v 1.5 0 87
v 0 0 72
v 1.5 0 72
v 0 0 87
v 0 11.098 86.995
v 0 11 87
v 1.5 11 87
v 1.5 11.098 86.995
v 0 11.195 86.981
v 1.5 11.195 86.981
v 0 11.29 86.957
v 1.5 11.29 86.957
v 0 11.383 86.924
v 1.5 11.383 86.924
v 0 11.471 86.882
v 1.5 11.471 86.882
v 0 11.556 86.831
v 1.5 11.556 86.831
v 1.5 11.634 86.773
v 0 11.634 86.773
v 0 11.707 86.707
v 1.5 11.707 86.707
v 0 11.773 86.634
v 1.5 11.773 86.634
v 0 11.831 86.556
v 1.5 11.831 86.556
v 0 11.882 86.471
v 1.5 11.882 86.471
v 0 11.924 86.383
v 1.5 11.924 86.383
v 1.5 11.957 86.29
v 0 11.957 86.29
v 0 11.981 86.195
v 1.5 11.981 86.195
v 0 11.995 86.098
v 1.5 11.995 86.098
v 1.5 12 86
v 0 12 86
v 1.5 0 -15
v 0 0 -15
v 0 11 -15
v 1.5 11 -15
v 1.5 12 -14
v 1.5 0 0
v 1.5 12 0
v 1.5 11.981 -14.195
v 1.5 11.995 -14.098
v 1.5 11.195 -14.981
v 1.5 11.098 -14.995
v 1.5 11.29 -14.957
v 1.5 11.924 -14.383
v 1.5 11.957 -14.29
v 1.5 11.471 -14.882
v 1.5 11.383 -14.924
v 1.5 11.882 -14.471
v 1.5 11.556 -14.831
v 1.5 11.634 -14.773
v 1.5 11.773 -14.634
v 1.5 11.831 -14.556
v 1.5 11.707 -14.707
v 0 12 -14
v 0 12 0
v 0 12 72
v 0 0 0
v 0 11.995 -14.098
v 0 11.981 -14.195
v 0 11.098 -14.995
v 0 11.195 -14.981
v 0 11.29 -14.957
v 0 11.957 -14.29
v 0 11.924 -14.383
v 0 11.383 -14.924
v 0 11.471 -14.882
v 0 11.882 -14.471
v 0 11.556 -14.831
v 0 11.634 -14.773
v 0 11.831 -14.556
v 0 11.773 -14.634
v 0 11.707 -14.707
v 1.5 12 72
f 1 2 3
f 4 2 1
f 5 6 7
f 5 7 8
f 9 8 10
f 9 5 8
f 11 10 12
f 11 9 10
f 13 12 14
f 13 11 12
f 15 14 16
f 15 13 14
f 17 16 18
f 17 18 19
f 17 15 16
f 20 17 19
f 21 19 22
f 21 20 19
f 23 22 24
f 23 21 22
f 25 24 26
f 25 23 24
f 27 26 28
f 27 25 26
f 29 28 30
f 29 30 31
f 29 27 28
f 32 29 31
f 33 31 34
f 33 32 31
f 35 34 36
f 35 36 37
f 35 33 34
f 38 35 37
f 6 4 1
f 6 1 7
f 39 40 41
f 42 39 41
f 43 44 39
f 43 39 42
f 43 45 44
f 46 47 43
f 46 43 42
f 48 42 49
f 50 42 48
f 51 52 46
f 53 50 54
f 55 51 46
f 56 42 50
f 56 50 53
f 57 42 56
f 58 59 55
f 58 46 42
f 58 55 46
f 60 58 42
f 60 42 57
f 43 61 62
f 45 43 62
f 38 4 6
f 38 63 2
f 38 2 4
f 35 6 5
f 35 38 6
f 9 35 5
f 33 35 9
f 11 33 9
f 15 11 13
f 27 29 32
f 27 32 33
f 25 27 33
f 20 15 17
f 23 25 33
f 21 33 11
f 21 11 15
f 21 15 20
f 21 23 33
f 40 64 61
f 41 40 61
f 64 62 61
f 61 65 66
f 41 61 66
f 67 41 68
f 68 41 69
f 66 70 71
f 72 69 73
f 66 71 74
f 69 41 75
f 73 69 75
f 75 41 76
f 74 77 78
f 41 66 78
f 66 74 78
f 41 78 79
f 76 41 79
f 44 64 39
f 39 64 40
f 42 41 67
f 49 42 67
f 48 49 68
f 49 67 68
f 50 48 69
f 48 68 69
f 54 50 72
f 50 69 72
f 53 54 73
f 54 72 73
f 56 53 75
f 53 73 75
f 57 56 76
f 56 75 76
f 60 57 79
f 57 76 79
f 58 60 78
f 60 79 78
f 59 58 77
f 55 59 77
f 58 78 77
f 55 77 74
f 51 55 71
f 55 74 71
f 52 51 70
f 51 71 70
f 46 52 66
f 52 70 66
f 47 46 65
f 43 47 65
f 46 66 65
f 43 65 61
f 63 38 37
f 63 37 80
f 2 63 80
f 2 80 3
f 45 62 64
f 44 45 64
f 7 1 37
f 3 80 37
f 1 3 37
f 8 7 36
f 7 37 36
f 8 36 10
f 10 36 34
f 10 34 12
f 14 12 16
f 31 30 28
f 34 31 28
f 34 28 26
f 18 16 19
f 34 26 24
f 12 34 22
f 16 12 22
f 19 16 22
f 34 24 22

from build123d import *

# Parameters (mm, degrees)
BOSS_EXTRUDE1_DEPTH   = 1.5
BOSS_EXTRUDE1_2_DEPTH = 1.5


with BuildPart() as part:
    # Sketch1 → Boss-Extrude1 (new body)
    with BuildSketch(Plane(origin=(0, 0, 0), x_dir=(0, 0, -1), z_dir=(1, 0, 0))):
        with BuildLine():
            Line((0, 0), (15, 0))
            Line((15, 0), (15, 11))
            ThreePointArc((15, 11), (14.707106781, 11.707106781), (14, 12))
            Line((14, 12), (0, 12))
            Line((0, 12), (0, 0))
        make_face()
    extrude(amount=BOSS_EXTRUDE1_DEPTH)


with BuildPart() as body_2:
    # Sketch1 → Boss-Extrude1 2 (new body)
    with BuildSketch(Plane(origin=(0, 0, 0), x_dir=(0, 0, -1), z_dir=(1, 0, 0))):
        with BuildLine():
            Line((-87, 0), (-87, 11))
            ThreePointArc((-87, 11), (-86.707106781, 11.707106781), (-86, 12))
            Line((-86, 12), (-72, 12))
            Line((-72, 12), (-72, 0))
            Line((-72, 0), (-87, 0))
        make_face()
    extrude(amount=BOSS_EXTRUDE1_2_DEPTH)


solid = Compound([part.part, body_2.part])
